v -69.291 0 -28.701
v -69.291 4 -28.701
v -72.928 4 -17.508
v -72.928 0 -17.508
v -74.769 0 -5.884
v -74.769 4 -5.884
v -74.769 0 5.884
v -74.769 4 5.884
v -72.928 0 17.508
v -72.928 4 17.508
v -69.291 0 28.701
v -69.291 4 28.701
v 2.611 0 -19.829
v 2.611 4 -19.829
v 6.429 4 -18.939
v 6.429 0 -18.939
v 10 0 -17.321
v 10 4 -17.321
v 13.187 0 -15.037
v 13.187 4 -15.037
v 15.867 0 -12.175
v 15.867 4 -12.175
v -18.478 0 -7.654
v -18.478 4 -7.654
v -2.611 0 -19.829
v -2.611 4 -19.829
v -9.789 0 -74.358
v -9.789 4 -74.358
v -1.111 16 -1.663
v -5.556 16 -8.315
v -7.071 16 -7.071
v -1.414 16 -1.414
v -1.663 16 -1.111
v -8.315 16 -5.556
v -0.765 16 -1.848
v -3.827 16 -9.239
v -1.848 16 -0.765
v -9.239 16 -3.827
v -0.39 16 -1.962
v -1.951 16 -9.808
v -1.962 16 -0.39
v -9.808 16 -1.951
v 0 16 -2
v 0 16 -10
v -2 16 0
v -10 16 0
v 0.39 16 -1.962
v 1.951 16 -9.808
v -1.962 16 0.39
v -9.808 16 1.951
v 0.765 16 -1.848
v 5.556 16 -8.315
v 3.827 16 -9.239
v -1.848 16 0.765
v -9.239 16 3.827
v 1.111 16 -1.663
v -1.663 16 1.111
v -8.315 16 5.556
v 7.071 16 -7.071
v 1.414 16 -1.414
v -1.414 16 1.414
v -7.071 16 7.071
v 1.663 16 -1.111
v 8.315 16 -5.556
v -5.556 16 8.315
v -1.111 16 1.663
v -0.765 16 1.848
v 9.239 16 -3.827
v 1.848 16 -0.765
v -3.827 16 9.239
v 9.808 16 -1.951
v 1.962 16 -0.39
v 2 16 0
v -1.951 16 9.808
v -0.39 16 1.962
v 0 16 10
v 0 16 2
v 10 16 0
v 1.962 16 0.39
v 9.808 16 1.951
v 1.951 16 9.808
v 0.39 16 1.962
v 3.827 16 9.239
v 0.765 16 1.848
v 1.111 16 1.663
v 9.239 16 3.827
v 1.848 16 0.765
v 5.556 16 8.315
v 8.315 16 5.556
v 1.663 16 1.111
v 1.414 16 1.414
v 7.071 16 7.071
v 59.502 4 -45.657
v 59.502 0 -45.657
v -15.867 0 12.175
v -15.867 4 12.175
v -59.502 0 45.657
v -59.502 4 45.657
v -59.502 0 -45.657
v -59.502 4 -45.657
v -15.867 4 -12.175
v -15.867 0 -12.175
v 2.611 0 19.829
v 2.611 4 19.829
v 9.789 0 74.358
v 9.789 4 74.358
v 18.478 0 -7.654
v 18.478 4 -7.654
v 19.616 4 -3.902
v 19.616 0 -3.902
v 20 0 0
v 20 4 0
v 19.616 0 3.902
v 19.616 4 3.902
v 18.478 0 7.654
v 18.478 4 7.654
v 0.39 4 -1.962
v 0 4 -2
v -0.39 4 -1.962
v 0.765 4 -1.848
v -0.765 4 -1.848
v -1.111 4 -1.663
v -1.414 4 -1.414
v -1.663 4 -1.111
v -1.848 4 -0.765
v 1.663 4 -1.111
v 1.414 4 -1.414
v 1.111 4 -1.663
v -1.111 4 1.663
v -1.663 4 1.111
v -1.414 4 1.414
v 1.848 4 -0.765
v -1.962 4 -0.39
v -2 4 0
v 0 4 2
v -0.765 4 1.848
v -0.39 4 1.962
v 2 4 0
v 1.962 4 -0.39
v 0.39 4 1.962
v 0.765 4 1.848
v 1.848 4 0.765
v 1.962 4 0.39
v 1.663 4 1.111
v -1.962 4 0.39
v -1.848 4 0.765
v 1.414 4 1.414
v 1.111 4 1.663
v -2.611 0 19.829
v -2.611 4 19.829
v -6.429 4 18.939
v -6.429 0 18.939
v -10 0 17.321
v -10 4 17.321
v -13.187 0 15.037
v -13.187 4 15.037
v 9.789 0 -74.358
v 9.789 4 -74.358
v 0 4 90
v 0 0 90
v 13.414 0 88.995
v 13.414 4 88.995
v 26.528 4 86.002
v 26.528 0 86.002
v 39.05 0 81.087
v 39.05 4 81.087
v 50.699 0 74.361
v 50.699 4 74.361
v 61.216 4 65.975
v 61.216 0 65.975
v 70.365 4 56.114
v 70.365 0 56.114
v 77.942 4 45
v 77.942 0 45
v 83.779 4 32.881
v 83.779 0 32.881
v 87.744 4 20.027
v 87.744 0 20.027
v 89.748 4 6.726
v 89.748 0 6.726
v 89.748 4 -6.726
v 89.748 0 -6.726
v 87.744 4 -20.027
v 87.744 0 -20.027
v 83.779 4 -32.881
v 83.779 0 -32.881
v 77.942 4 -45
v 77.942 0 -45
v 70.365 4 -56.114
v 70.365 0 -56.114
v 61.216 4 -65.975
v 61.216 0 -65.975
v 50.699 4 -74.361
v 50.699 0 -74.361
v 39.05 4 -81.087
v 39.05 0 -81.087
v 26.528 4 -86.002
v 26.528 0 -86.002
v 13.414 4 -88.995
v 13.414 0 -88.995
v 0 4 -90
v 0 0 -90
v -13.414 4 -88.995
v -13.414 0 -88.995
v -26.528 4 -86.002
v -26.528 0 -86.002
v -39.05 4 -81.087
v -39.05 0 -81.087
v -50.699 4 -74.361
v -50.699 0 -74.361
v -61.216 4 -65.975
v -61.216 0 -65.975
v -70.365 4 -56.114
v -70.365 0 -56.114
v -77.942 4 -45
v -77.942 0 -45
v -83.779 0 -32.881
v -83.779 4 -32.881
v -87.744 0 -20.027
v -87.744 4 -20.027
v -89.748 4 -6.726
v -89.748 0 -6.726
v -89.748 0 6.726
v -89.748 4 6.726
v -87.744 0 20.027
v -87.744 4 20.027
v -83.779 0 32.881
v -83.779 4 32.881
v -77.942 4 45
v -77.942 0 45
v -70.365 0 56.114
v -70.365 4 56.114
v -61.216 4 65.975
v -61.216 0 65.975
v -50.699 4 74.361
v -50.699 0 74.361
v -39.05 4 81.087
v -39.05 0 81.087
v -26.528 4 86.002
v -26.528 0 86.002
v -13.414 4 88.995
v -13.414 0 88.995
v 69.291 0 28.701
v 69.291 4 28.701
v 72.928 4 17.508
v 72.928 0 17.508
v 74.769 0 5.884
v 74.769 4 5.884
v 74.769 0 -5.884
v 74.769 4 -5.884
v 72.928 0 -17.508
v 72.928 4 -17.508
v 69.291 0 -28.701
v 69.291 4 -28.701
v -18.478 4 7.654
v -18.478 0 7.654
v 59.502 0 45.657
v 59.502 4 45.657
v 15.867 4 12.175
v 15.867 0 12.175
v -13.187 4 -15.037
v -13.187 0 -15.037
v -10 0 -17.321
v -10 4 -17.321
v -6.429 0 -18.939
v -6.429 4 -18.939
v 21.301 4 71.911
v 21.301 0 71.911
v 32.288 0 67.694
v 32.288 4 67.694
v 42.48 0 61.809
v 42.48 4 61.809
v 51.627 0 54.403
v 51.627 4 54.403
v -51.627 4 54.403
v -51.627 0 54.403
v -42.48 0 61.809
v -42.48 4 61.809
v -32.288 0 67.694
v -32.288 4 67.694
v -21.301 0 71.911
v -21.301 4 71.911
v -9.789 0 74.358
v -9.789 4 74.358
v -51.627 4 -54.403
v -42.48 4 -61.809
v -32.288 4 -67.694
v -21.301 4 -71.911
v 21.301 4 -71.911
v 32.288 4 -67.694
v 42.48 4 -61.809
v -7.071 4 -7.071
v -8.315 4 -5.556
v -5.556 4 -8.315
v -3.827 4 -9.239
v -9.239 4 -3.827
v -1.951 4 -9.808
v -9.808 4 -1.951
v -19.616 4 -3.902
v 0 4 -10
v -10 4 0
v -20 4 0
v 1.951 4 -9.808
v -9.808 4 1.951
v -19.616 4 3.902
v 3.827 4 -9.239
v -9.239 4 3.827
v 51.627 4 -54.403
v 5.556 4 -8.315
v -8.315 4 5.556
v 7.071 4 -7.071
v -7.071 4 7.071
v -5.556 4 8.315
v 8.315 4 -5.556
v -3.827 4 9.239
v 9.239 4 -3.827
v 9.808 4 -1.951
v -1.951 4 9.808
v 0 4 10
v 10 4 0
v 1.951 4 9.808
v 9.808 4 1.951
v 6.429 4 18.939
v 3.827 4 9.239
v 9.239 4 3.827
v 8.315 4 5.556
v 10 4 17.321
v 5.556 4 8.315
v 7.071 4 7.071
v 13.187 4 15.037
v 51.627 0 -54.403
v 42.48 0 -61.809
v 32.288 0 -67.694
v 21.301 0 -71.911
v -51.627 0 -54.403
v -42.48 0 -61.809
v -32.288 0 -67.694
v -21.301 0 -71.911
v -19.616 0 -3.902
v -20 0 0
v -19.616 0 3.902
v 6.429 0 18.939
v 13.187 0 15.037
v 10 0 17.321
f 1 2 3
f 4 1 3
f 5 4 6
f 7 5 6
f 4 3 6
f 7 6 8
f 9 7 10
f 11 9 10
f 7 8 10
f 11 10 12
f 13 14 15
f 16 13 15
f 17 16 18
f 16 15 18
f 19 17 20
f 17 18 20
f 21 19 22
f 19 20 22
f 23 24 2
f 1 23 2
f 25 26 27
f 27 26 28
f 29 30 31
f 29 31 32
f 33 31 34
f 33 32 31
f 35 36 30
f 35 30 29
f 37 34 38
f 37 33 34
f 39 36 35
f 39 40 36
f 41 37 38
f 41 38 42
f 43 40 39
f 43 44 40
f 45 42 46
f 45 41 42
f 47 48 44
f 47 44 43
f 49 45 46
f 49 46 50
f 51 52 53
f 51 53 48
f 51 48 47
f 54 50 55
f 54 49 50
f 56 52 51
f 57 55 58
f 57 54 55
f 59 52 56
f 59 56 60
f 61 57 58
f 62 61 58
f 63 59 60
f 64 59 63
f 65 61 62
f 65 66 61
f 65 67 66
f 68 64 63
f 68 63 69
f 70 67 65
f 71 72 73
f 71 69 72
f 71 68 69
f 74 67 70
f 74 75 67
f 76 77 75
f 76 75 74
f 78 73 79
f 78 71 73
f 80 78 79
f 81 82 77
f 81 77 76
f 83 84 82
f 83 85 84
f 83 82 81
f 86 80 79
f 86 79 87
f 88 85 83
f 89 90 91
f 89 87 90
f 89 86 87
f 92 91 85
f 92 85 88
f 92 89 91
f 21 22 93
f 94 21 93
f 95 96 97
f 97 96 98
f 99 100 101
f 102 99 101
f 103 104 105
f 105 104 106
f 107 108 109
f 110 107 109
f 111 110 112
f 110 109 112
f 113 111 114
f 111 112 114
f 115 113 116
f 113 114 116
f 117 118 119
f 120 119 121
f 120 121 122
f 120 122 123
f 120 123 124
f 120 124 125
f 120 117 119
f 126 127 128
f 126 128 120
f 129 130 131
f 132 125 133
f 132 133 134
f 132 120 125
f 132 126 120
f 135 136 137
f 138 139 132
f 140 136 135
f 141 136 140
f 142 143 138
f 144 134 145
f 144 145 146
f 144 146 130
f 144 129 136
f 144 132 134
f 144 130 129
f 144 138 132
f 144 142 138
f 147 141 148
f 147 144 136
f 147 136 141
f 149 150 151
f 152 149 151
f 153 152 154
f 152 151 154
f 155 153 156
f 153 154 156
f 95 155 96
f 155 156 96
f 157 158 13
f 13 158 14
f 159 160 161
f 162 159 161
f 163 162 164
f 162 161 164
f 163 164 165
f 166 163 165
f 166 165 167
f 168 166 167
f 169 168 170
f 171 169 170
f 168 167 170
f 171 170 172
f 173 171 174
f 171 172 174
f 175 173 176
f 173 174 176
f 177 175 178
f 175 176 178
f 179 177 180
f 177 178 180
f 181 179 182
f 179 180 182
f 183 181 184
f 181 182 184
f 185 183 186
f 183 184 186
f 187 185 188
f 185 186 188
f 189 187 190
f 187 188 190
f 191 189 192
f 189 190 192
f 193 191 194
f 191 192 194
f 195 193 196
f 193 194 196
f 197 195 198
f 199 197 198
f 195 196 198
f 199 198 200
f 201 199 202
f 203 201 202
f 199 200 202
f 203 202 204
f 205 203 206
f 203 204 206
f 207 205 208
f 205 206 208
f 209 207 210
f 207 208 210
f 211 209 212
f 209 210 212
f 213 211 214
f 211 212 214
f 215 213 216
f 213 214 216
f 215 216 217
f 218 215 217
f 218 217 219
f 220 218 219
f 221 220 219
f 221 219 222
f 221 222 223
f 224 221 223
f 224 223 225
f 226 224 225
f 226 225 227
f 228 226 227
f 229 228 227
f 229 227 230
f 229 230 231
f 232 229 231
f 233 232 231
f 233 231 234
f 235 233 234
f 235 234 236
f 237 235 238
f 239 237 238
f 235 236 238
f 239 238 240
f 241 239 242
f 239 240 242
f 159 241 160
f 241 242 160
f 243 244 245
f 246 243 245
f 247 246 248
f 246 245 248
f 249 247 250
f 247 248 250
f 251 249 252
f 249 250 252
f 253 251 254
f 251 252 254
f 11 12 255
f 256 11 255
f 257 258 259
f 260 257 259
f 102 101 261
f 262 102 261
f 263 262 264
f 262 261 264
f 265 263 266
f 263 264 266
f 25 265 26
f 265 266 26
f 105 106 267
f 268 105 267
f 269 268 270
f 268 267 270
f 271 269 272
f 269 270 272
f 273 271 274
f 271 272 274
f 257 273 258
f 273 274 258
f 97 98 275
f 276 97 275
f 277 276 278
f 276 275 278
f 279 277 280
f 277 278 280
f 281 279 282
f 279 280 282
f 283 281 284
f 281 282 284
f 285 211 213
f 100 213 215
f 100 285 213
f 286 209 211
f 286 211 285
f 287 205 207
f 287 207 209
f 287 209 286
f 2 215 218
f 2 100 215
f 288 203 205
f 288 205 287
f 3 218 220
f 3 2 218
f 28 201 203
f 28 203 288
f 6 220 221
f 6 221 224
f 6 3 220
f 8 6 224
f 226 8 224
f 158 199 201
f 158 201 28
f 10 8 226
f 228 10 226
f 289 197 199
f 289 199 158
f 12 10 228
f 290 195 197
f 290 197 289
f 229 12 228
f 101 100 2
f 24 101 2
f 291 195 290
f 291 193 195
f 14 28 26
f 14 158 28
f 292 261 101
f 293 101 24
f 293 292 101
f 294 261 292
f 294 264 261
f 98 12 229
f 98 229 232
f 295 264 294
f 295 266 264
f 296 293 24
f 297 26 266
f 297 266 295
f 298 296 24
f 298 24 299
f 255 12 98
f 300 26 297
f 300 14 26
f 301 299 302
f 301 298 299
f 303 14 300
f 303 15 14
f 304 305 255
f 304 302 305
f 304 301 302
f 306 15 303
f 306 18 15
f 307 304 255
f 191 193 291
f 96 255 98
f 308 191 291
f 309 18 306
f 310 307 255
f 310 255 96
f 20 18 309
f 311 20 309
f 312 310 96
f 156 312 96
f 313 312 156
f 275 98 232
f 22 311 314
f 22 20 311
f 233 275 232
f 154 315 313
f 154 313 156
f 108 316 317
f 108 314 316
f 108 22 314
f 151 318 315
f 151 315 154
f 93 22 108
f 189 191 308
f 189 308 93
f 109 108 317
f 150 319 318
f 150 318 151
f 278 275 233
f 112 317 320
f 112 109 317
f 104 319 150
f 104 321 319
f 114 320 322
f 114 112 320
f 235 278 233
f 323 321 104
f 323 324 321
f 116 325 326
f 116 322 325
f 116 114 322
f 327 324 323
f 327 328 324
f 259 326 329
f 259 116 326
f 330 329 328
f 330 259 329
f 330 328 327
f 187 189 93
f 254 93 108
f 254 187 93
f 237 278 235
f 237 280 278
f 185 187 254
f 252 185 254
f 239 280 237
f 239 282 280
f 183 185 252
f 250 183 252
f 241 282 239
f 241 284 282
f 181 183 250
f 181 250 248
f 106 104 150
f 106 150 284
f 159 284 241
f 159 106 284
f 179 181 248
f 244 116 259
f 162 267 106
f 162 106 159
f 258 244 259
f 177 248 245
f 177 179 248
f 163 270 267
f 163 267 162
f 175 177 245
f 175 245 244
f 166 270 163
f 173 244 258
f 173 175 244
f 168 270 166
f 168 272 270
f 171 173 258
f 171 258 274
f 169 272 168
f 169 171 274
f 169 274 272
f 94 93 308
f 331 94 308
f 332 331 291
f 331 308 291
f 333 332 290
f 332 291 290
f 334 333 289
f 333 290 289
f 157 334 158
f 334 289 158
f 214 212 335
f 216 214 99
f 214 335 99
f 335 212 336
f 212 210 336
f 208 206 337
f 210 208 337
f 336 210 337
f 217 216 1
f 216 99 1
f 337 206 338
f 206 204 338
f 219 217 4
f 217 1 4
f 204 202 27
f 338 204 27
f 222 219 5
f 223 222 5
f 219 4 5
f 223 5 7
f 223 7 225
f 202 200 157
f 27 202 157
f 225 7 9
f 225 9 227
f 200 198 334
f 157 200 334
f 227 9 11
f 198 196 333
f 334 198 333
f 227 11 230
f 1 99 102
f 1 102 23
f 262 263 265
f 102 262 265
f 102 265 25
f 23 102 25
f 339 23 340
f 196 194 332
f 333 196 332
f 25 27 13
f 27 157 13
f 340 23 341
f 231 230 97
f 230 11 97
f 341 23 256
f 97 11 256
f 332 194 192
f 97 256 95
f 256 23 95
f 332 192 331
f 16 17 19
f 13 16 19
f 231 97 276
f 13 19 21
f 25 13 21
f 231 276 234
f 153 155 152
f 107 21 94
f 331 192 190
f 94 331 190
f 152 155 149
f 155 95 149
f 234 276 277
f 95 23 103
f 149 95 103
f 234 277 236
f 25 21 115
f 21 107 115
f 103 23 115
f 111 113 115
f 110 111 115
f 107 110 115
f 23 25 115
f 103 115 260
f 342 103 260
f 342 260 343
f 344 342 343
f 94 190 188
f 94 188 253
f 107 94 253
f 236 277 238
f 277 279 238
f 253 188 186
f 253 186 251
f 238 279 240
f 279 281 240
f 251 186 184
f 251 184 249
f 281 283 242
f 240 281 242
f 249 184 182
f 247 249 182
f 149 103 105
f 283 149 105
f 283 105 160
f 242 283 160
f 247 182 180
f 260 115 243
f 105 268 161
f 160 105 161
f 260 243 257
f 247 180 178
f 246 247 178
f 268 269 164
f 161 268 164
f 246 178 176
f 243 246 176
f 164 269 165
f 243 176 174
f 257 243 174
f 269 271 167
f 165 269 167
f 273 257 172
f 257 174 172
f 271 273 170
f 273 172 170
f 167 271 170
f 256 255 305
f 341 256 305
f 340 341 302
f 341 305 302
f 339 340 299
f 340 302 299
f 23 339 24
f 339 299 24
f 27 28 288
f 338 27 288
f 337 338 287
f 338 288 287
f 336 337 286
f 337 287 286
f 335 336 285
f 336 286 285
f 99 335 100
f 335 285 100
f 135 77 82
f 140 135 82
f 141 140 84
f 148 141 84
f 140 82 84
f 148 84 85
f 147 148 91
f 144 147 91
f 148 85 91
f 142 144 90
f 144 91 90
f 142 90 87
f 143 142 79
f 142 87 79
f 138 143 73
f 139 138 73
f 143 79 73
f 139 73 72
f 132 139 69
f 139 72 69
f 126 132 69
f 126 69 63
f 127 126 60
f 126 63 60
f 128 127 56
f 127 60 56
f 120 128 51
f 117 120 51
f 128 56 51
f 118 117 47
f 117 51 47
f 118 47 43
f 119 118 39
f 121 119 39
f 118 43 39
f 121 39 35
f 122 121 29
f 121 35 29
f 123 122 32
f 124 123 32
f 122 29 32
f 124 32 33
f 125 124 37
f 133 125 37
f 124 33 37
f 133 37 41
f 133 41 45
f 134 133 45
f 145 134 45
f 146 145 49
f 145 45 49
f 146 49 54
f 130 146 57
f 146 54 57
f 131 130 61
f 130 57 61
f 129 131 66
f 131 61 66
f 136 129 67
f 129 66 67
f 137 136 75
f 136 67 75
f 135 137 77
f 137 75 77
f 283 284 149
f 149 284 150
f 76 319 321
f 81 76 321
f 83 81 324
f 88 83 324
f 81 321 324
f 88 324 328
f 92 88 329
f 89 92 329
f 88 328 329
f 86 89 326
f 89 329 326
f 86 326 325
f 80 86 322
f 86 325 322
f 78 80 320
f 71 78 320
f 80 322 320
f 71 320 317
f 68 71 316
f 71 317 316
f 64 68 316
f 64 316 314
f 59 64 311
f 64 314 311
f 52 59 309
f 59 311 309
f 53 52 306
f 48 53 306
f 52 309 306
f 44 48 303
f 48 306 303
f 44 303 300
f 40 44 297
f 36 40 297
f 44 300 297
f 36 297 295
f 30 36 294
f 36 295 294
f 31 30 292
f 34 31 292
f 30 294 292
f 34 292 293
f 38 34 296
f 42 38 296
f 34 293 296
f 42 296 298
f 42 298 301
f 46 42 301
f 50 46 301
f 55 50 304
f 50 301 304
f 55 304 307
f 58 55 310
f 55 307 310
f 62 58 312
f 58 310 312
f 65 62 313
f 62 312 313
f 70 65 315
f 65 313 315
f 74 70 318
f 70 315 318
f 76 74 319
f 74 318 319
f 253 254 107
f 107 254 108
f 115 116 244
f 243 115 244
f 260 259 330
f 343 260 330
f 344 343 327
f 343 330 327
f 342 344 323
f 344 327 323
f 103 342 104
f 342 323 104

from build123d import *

# Parameters (mm, degrees)
SKETCH_1_R               = 90
EXTRUDE_1_DEPTH          = 4
CUT_EXTRUDE_1_DEPTH      = 128.342059038
PATTERN_CIRCULAR_1_COUNT = 6
SKETCH_6_R               = 10
EXTRUDE_2_DEPTH          = 12
SKETCH_7_R               = 2
CUT_EXTRUDE_2_DEPTH      = 12


with BuildPart() as part:
    # 草图1 → 凸台-拉伸1 (new body)
    with BuildSketch(Plane(origin=(0, 0, 0), x_dir=(1, 0, 0), z_dir=(0, 1, 0))):
        Circle(SKETCH_1_R)
    extrude(amount=EXTRUDE_1_DEPTH)

    # 草图2 → 切除-拉伸1 (cut, through all)
    with BuildSketch(Plane(origin=(0, 4, 0), x_dir=(1, 0, 0), z_dir=(0, 1, 0))):
        with BuildLine():
            ThreePointArc((-15.867066806, 12.17522858), (-10, 17.320508076), (-2.610523844, 19.828897227))
            Line((-2.610523844, 19.828897227), (-9.789464417, 74.358364603))
            ThreePointArc((-9.789464417, 74.358364603), (-37.5, 64.951905284), (-59.501500522, 45.657107176))
            Line((-59.501500522, 45.657107176), (-15.867066806, 12.17522858))
        make_face()
    cut_extrude_1 = extrude(amount=-CUT_EXTRUDE_1_DEPTH, mode=Mode.SUBTRACT)

    # 阵列(圆周)1: 切除-拉伸1 ×6 about axis
    pattern_circular_1_axis = Axis((0, 4, 0), (0, 1, 0))
    for i in range(1, PATTERN_CIRCULAR_1_COUNT):
        add(cut_extrude_1.rotate(pattern_circular_1_axis, i * 360 / PATTERN_CIRCULAR_1_COUNT), mode=Mode.SUBTRACT)

    # 草图6 → 凸台-拉伸2 (add)
    with BuildSketch(Plane(origin=(0, 4, 0), x_dir=(1, 0, 0), z_dir=(0, 1, 0))):
        Circle(SKETCH_6_R)
    extrude(amount=EXTRUDE_2_DEPTH)

    # 草图7 → 切除-拉伸2 (cut)
    with BuildSketch(Plane(origin=(0, 16, 0), x_dir=(1, 0, 0), z_dir=(0, 1, 0))):
        Circle(SKETCH_7_R)
    extrude(amount=-CUT_EXTRUDE_2_DEPTH, mode=Mode.SUBTRACT)


solid = part.part
